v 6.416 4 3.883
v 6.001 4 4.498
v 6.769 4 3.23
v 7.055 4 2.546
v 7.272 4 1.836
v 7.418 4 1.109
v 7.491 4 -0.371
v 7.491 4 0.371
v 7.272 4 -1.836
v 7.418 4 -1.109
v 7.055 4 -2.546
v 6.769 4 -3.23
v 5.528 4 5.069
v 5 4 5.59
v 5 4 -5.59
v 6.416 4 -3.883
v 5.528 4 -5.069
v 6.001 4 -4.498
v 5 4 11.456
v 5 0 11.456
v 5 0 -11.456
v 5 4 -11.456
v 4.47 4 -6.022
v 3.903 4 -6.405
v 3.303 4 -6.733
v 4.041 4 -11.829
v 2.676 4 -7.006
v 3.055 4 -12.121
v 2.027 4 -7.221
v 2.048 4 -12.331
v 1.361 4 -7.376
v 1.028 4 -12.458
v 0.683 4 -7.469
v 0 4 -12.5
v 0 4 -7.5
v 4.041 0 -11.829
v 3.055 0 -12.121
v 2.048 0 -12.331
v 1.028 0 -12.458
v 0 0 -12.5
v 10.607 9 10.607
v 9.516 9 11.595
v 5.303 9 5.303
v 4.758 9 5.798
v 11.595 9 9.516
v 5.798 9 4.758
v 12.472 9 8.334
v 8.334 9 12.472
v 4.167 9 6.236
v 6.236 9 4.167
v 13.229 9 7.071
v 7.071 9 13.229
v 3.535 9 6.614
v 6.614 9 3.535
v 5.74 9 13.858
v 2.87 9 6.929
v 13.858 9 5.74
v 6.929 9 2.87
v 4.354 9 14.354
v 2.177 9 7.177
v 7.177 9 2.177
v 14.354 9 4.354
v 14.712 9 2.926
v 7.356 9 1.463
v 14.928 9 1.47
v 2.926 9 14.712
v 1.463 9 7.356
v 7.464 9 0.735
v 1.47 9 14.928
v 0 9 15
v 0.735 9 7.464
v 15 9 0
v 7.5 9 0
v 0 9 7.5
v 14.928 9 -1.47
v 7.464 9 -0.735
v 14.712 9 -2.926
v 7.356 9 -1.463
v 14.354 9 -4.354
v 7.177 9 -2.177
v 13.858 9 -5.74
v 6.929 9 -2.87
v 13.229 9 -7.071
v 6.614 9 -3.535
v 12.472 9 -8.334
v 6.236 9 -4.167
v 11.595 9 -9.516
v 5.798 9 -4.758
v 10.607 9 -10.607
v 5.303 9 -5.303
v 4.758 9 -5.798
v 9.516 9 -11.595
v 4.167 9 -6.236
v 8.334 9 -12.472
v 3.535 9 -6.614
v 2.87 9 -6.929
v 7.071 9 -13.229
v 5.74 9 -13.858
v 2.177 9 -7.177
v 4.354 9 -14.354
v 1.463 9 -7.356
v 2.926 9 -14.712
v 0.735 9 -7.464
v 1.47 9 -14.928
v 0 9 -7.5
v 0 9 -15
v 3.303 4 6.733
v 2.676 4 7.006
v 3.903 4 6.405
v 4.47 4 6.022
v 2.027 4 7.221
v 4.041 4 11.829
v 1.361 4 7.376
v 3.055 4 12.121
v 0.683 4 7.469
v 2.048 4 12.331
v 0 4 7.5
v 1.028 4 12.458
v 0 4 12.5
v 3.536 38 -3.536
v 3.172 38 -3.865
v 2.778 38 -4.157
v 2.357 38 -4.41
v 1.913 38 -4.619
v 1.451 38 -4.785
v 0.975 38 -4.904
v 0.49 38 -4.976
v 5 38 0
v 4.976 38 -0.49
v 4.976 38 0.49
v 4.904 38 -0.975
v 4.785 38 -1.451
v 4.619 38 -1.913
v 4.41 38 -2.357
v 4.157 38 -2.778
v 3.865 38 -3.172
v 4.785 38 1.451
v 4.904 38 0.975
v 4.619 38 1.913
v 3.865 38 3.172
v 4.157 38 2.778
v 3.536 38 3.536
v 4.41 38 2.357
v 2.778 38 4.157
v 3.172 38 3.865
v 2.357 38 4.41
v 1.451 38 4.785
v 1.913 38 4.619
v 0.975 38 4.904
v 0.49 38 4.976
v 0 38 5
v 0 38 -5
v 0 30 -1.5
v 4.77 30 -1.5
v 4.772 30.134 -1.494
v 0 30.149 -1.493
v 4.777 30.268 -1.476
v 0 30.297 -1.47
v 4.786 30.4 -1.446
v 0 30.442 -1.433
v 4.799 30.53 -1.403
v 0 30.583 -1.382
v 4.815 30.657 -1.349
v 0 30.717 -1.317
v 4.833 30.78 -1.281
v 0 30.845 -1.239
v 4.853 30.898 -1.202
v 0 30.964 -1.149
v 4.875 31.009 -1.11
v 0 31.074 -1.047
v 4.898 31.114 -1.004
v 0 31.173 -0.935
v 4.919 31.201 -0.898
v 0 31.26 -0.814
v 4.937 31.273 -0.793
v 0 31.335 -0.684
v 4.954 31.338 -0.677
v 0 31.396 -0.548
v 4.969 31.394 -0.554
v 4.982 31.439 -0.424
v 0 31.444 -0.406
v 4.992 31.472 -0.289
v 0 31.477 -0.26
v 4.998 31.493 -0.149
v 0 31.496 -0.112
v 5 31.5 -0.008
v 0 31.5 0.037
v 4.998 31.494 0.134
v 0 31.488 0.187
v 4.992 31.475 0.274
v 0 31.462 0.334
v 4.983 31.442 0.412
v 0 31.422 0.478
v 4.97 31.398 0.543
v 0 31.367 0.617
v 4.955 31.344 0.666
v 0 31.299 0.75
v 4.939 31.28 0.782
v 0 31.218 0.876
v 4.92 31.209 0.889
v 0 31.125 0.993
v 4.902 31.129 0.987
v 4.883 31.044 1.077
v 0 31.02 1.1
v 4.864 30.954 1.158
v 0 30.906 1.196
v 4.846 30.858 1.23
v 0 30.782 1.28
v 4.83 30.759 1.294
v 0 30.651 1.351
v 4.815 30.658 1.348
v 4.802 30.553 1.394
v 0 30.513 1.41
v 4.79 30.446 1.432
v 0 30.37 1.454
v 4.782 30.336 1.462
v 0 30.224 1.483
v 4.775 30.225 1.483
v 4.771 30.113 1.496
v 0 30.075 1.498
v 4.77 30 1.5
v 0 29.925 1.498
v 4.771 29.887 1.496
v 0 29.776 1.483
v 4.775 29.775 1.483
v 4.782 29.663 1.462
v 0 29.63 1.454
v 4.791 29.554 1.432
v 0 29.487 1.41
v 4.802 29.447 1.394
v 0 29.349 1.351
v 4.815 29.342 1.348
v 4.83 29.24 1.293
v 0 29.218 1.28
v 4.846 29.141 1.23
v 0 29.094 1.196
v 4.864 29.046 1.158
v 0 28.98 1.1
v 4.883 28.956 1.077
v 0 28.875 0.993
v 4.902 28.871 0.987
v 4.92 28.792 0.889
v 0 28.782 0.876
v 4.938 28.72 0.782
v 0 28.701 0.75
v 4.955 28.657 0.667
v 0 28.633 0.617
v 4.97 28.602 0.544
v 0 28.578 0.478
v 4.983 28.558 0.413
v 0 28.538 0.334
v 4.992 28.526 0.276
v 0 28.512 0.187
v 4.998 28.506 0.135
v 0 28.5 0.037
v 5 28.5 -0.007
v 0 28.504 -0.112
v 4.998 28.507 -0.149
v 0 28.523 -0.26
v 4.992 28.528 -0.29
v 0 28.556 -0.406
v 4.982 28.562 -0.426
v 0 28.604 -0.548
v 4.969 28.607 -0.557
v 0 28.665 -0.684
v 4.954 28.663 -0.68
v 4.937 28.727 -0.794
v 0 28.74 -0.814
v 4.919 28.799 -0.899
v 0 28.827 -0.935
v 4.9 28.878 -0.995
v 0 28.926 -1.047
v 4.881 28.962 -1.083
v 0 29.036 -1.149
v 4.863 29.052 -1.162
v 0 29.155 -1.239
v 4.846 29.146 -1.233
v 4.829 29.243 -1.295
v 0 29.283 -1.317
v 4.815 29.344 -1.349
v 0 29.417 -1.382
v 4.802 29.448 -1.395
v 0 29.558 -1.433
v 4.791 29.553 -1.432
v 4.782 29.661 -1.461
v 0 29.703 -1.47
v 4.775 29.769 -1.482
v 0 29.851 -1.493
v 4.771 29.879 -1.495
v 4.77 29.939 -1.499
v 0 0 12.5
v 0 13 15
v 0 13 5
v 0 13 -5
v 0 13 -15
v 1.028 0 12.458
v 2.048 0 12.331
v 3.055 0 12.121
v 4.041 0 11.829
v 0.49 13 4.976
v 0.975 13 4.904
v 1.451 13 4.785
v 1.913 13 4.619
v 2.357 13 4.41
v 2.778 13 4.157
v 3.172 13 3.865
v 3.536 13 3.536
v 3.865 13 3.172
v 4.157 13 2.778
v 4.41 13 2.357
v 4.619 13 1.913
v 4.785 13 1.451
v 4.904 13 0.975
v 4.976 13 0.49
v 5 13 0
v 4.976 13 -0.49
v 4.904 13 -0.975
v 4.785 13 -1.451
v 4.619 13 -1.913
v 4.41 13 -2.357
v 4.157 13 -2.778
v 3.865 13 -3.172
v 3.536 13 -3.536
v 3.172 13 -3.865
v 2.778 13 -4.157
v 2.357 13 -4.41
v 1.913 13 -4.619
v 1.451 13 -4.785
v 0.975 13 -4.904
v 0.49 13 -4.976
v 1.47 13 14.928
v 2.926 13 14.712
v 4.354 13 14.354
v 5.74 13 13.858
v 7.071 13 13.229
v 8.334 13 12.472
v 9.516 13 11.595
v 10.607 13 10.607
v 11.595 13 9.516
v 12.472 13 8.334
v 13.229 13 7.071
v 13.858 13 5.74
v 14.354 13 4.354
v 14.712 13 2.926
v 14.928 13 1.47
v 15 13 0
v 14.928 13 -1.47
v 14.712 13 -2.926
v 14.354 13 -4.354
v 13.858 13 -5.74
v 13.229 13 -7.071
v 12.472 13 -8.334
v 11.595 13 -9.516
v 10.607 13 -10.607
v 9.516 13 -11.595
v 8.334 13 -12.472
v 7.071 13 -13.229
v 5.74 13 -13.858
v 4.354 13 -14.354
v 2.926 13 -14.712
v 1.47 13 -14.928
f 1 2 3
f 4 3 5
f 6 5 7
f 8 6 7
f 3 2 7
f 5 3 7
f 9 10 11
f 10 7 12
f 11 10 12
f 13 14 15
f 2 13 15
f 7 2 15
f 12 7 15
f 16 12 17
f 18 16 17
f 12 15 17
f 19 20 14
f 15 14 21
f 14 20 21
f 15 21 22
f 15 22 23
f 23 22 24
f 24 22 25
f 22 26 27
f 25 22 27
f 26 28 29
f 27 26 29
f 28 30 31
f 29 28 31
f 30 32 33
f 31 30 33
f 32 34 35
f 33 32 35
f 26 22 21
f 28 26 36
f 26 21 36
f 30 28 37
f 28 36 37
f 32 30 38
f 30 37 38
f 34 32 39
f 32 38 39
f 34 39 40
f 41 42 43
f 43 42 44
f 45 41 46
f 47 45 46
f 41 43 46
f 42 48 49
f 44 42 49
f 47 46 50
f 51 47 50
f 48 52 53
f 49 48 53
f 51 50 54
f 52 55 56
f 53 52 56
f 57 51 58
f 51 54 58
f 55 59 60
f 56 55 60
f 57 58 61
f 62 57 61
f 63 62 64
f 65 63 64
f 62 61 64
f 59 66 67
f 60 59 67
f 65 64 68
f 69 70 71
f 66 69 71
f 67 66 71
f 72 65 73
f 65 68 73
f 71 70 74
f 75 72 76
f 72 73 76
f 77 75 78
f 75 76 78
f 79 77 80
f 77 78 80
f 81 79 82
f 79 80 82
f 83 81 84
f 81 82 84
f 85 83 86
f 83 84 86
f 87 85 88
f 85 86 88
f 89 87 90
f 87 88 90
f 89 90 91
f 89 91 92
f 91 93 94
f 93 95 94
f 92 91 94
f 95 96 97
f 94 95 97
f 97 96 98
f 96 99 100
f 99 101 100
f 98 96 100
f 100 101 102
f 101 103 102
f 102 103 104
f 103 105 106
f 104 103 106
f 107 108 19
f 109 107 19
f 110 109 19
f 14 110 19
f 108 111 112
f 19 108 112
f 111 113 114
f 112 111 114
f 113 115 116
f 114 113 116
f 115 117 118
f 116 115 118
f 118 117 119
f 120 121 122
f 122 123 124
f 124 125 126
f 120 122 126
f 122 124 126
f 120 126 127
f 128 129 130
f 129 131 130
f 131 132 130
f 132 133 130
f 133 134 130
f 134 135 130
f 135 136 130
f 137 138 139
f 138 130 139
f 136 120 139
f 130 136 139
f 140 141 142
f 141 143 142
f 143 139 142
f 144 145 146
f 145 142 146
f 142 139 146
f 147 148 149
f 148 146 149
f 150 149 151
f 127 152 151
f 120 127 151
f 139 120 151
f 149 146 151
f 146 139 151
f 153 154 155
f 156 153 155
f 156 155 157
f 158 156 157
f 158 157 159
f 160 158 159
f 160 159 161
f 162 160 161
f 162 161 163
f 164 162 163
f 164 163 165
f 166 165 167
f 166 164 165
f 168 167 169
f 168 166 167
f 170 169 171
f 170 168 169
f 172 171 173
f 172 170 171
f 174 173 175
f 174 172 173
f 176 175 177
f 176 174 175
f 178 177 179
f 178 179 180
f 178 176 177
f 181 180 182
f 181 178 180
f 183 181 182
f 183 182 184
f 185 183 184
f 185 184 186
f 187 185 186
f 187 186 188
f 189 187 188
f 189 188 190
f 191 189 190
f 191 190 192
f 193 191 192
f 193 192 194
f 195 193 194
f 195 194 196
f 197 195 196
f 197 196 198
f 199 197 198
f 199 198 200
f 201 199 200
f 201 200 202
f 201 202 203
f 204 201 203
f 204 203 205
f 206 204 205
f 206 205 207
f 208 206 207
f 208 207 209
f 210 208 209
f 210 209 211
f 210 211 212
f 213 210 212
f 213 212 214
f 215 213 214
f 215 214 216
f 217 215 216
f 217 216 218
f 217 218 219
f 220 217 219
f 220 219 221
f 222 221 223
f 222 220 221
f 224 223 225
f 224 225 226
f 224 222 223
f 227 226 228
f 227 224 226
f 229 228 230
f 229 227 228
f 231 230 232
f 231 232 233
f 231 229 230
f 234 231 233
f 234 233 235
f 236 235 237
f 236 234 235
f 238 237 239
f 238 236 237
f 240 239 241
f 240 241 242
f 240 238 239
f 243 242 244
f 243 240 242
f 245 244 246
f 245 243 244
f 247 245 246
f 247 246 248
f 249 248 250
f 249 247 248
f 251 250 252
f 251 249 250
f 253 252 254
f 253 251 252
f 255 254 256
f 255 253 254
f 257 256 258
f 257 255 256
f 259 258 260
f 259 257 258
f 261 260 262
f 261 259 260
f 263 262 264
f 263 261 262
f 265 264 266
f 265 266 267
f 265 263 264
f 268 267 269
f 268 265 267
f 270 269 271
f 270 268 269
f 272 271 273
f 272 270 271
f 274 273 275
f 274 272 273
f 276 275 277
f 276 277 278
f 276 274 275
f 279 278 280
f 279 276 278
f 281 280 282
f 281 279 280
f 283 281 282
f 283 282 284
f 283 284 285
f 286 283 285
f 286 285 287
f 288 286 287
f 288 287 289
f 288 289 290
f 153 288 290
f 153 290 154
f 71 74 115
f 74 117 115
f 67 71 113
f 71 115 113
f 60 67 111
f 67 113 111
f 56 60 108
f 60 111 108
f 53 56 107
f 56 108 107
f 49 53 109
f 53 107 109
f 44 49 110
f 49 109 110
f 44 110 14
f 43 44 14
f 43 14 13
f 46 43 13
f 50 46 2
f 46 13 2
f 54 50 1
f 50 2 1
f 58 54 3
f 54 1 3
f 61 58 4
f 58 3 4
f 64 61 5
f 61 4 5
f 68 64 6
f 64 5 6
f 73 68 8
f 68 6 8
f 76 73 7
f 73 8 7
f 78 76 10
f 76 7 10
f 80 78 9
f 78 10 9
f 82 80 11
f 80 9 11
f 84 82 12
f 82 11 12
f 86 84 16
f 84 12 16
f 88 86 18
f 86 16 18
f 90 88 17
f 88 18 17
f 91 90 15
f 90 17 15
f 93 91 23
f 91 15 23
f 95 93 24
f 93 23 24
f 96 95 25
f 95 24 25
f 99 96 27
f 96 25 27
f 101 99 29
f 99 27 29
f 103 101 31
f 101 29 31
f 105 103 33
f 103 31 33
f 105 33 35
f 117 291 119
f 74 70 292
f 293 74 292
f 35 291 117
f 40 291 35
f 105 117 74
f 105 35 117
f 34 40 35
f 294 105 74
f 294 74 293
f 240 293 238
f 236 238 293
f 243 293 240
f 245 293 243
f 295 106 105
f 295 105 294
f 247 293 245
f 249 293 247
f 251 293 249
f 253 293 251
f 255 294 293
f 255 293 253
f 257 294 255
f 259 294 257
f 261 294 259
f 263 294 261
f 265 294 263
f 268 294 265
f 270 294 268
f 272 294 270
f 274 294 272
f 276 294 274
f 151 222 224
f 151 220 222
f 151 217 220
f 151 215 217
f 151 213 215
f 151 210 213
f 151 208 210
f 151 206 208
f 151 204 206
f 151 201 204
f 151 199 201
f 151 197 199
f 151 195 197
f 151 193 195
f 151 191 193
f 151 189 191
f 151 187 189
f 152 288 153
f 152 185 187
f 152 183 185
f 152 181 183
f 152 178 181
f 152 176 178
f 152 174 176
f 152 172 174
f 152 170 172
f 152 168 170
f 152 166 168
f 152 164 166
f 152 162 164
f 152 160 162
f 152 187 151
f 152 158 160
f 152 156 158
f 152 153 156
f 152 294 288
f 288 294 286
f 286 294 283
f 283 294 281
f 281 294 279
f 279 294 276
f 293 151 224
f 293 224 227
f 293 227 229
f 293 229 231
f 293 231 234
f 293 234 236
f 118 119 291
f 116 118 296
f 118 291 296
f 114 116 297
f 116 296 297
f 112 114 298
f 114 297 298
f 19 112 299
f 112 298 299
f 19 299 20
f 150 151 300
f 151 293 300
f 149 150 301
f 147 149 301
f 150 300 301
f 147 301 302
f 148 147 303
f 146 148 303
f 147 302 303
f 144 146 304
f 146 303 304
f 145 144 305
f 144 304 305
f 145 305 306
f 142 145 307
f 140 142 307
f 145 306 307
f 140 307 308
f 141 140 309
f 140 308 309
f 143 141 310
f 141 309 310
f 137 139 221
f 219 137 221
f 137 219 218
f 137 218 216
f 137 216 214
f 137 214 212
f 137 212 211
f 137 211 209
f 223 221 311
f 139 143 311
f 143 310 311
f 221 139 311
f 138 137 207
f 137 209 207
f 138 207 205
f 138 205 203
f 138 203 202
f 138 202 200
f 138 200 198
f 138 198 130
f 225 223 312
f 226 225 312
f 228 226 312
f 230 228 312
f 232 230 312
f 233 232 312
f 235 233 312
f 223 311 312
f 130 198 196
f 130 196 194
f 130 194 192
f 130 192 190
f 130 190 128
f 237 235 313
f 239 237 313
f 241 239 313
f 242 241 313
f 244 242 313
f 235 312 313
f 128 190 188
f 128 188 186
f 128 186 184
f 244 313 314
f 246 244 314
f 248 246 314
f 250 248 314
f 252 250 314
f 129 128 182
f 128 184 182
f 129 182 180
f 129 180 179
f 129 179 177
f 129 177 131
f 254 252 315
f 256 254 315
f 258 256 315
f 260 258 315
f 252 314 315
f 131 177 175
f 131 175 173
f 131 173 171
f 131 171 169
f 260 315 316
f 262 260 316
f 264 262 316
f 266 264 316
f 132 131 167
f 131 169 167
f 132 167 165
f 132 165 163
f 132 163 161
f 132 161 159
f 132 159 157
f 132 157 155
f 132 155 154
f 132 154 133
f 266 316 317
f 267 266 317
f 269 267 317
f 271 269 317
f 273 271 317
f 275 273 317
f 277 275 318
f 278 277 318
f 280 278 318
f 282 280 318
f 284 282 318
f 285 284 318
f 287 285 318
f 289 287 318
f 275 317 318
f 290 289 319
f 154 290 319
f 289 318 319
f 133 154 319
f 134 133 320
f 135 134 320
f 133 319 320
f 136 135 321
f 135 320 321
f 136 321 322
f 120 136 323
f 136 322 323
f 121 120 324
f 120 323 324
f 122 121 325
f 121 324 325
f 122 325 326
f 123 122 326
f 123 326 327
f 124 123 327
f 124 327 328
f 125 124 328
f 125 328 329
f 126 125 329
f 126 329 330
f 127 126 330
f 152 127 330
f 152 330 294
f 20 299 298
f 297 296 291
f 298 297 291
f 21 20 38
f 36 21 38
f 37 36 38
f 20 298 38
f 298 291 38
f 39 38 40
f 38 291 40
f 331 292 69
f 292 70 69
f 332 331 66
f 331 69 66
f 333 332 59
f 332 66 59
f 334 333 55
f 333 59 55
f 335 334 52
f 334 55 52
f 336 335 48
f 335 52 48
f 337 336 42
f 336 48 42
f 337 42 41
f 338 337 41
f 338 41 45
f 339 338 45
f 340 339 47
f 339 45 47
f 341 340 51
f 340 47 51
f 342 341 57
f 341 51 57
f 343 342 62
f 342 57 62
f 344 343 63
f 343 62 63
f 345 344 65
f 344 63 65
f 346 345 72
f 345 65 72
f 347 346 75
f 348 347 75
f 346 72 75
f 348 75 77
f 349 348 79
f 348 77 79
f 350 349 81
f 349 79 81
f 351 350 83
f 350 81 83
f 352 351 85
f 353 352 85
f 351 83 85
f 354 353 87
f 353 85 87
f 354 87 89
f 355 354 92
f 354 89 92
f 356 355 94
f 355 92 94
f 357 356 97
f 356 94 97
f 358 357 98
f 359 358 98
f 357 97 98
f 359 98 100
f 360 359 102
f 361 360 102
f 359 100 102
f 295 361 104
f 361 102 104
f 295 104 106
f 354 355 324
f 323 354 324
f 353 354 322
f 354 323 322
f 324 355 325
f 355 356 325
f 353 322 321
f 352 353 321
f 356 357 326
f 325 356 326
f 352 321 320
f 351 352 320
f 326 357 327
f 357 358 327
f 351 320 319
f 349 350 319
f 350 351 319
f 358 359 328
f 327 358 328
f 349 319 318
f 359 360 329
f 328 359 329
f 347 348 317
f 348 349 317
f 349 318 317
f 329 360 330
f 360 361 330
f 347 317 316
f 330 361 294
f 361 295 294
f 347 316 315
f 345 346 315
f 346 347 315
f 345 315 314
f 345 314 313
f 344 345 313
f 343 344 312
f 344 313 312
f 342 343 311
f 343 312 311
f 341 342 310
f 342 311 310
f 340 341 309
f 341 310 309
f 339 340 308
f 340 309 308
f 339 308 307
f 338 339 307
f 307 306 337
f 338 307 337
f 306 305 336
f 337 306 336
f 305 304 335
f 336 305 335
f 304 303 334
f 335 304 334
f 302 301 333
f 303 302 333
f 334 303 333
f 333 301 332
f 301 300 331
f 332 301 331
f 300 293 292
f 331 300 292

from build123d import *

# Parameters (mm, degrees)
CUT_EXTRUDE1_DEPTH      = 44.520110294
CUT_EXTRUDE1_DEPTH_BACK = 44.520110294
SKETCH2_W               = 21.666012185
SKETCH2_H               = 9.766463862
CUT_EXTRUDE2_DEPTH      = 44.520110294
CUT_EXTRUDE2_DEPTH_BACK = 44.520110294
SKETCH3_R               = 1.5
CUT_EXTRUDE3_DEPTH      = 44.520110381
CUT_EXTRUDE3_DEPTH_BACK = 44.520110381
SKETCH4_W               = 24.279573728
SKETCH4_H               = 56.824995672


with BuildPart() as part:
    # Sketch1 → Revolve1 (revolve)
    with BuildSketch(Plane.XY, mode=Mode.PRIVATE) as revolve1_sk:
        Polygon((0, 0), (0, 38), (5, 38), (5, 13), (15, 13), (15, 9), (7.5, 9), (7.5, 4), (12.5, 4), (12.5, 0), align=None)
    revolve(revolve1_sk.sketch.rotate(Axis((0, 0, 0), (0, 1, 0)), 90), axis=Axis((0, 0, 0), (0, 1, 0)))

    # Sketch2 → Cut-Extrude1 (cut, two sides: drawn at the far end of the back side and taken through both)
    with BuildSketch(Plane.XY.offset(-CUT_EXTRUDE1_DEPTH_BACK)):
        with Locations((15.833006093, -0.883231931)):
            Rectangle(SKETCH2_W, SKETCH2_H)
    extrude(amount=CUT_EXTRUDE1_DEPTH + CUT_EXTRUDE1_DEPTH_BACK, mode=Mode.SUBTRACT)

    # Sketch3 → Cut-Extrude2 (cut, two sides: drawn at the far end of the back side and taken through both)
    with BuildSketch(Plane(origin=(0, 0, 0), x_dir=(0, 0, -1), z_dir=(1, 0, 0)).offset(-CUT_EXTRUDE2_DEPTH_BACK)):
        with Locations((0, 30)):
            Circle(SKETCH3_R)
    extrude(amount=CUT_EXTRUDE2_DEPTH + CUT_EXTRUDE2_DEPTH_BACK, mode=Mode.SUBTRACT)

    # Sketch4 → Cut-Extrude3 (cut, two sides: drawn at the far end of the back side and taken through both)
    with BuildSketch(Plane.XY.offset(-CUT_EXTRUDE3_DEPTH_BACK)):
        with Locations((-12.139786864, 22.787379867)):
            Rectangle(SKETCH4_W, SKETCH4_H)
    extrude(amount=CUT_EXTRUDE3_DEPTH + CUT_EXTRUDE3_DEPTH_BACK, mode=Mode.SUBTRACT)


solid = part.part
